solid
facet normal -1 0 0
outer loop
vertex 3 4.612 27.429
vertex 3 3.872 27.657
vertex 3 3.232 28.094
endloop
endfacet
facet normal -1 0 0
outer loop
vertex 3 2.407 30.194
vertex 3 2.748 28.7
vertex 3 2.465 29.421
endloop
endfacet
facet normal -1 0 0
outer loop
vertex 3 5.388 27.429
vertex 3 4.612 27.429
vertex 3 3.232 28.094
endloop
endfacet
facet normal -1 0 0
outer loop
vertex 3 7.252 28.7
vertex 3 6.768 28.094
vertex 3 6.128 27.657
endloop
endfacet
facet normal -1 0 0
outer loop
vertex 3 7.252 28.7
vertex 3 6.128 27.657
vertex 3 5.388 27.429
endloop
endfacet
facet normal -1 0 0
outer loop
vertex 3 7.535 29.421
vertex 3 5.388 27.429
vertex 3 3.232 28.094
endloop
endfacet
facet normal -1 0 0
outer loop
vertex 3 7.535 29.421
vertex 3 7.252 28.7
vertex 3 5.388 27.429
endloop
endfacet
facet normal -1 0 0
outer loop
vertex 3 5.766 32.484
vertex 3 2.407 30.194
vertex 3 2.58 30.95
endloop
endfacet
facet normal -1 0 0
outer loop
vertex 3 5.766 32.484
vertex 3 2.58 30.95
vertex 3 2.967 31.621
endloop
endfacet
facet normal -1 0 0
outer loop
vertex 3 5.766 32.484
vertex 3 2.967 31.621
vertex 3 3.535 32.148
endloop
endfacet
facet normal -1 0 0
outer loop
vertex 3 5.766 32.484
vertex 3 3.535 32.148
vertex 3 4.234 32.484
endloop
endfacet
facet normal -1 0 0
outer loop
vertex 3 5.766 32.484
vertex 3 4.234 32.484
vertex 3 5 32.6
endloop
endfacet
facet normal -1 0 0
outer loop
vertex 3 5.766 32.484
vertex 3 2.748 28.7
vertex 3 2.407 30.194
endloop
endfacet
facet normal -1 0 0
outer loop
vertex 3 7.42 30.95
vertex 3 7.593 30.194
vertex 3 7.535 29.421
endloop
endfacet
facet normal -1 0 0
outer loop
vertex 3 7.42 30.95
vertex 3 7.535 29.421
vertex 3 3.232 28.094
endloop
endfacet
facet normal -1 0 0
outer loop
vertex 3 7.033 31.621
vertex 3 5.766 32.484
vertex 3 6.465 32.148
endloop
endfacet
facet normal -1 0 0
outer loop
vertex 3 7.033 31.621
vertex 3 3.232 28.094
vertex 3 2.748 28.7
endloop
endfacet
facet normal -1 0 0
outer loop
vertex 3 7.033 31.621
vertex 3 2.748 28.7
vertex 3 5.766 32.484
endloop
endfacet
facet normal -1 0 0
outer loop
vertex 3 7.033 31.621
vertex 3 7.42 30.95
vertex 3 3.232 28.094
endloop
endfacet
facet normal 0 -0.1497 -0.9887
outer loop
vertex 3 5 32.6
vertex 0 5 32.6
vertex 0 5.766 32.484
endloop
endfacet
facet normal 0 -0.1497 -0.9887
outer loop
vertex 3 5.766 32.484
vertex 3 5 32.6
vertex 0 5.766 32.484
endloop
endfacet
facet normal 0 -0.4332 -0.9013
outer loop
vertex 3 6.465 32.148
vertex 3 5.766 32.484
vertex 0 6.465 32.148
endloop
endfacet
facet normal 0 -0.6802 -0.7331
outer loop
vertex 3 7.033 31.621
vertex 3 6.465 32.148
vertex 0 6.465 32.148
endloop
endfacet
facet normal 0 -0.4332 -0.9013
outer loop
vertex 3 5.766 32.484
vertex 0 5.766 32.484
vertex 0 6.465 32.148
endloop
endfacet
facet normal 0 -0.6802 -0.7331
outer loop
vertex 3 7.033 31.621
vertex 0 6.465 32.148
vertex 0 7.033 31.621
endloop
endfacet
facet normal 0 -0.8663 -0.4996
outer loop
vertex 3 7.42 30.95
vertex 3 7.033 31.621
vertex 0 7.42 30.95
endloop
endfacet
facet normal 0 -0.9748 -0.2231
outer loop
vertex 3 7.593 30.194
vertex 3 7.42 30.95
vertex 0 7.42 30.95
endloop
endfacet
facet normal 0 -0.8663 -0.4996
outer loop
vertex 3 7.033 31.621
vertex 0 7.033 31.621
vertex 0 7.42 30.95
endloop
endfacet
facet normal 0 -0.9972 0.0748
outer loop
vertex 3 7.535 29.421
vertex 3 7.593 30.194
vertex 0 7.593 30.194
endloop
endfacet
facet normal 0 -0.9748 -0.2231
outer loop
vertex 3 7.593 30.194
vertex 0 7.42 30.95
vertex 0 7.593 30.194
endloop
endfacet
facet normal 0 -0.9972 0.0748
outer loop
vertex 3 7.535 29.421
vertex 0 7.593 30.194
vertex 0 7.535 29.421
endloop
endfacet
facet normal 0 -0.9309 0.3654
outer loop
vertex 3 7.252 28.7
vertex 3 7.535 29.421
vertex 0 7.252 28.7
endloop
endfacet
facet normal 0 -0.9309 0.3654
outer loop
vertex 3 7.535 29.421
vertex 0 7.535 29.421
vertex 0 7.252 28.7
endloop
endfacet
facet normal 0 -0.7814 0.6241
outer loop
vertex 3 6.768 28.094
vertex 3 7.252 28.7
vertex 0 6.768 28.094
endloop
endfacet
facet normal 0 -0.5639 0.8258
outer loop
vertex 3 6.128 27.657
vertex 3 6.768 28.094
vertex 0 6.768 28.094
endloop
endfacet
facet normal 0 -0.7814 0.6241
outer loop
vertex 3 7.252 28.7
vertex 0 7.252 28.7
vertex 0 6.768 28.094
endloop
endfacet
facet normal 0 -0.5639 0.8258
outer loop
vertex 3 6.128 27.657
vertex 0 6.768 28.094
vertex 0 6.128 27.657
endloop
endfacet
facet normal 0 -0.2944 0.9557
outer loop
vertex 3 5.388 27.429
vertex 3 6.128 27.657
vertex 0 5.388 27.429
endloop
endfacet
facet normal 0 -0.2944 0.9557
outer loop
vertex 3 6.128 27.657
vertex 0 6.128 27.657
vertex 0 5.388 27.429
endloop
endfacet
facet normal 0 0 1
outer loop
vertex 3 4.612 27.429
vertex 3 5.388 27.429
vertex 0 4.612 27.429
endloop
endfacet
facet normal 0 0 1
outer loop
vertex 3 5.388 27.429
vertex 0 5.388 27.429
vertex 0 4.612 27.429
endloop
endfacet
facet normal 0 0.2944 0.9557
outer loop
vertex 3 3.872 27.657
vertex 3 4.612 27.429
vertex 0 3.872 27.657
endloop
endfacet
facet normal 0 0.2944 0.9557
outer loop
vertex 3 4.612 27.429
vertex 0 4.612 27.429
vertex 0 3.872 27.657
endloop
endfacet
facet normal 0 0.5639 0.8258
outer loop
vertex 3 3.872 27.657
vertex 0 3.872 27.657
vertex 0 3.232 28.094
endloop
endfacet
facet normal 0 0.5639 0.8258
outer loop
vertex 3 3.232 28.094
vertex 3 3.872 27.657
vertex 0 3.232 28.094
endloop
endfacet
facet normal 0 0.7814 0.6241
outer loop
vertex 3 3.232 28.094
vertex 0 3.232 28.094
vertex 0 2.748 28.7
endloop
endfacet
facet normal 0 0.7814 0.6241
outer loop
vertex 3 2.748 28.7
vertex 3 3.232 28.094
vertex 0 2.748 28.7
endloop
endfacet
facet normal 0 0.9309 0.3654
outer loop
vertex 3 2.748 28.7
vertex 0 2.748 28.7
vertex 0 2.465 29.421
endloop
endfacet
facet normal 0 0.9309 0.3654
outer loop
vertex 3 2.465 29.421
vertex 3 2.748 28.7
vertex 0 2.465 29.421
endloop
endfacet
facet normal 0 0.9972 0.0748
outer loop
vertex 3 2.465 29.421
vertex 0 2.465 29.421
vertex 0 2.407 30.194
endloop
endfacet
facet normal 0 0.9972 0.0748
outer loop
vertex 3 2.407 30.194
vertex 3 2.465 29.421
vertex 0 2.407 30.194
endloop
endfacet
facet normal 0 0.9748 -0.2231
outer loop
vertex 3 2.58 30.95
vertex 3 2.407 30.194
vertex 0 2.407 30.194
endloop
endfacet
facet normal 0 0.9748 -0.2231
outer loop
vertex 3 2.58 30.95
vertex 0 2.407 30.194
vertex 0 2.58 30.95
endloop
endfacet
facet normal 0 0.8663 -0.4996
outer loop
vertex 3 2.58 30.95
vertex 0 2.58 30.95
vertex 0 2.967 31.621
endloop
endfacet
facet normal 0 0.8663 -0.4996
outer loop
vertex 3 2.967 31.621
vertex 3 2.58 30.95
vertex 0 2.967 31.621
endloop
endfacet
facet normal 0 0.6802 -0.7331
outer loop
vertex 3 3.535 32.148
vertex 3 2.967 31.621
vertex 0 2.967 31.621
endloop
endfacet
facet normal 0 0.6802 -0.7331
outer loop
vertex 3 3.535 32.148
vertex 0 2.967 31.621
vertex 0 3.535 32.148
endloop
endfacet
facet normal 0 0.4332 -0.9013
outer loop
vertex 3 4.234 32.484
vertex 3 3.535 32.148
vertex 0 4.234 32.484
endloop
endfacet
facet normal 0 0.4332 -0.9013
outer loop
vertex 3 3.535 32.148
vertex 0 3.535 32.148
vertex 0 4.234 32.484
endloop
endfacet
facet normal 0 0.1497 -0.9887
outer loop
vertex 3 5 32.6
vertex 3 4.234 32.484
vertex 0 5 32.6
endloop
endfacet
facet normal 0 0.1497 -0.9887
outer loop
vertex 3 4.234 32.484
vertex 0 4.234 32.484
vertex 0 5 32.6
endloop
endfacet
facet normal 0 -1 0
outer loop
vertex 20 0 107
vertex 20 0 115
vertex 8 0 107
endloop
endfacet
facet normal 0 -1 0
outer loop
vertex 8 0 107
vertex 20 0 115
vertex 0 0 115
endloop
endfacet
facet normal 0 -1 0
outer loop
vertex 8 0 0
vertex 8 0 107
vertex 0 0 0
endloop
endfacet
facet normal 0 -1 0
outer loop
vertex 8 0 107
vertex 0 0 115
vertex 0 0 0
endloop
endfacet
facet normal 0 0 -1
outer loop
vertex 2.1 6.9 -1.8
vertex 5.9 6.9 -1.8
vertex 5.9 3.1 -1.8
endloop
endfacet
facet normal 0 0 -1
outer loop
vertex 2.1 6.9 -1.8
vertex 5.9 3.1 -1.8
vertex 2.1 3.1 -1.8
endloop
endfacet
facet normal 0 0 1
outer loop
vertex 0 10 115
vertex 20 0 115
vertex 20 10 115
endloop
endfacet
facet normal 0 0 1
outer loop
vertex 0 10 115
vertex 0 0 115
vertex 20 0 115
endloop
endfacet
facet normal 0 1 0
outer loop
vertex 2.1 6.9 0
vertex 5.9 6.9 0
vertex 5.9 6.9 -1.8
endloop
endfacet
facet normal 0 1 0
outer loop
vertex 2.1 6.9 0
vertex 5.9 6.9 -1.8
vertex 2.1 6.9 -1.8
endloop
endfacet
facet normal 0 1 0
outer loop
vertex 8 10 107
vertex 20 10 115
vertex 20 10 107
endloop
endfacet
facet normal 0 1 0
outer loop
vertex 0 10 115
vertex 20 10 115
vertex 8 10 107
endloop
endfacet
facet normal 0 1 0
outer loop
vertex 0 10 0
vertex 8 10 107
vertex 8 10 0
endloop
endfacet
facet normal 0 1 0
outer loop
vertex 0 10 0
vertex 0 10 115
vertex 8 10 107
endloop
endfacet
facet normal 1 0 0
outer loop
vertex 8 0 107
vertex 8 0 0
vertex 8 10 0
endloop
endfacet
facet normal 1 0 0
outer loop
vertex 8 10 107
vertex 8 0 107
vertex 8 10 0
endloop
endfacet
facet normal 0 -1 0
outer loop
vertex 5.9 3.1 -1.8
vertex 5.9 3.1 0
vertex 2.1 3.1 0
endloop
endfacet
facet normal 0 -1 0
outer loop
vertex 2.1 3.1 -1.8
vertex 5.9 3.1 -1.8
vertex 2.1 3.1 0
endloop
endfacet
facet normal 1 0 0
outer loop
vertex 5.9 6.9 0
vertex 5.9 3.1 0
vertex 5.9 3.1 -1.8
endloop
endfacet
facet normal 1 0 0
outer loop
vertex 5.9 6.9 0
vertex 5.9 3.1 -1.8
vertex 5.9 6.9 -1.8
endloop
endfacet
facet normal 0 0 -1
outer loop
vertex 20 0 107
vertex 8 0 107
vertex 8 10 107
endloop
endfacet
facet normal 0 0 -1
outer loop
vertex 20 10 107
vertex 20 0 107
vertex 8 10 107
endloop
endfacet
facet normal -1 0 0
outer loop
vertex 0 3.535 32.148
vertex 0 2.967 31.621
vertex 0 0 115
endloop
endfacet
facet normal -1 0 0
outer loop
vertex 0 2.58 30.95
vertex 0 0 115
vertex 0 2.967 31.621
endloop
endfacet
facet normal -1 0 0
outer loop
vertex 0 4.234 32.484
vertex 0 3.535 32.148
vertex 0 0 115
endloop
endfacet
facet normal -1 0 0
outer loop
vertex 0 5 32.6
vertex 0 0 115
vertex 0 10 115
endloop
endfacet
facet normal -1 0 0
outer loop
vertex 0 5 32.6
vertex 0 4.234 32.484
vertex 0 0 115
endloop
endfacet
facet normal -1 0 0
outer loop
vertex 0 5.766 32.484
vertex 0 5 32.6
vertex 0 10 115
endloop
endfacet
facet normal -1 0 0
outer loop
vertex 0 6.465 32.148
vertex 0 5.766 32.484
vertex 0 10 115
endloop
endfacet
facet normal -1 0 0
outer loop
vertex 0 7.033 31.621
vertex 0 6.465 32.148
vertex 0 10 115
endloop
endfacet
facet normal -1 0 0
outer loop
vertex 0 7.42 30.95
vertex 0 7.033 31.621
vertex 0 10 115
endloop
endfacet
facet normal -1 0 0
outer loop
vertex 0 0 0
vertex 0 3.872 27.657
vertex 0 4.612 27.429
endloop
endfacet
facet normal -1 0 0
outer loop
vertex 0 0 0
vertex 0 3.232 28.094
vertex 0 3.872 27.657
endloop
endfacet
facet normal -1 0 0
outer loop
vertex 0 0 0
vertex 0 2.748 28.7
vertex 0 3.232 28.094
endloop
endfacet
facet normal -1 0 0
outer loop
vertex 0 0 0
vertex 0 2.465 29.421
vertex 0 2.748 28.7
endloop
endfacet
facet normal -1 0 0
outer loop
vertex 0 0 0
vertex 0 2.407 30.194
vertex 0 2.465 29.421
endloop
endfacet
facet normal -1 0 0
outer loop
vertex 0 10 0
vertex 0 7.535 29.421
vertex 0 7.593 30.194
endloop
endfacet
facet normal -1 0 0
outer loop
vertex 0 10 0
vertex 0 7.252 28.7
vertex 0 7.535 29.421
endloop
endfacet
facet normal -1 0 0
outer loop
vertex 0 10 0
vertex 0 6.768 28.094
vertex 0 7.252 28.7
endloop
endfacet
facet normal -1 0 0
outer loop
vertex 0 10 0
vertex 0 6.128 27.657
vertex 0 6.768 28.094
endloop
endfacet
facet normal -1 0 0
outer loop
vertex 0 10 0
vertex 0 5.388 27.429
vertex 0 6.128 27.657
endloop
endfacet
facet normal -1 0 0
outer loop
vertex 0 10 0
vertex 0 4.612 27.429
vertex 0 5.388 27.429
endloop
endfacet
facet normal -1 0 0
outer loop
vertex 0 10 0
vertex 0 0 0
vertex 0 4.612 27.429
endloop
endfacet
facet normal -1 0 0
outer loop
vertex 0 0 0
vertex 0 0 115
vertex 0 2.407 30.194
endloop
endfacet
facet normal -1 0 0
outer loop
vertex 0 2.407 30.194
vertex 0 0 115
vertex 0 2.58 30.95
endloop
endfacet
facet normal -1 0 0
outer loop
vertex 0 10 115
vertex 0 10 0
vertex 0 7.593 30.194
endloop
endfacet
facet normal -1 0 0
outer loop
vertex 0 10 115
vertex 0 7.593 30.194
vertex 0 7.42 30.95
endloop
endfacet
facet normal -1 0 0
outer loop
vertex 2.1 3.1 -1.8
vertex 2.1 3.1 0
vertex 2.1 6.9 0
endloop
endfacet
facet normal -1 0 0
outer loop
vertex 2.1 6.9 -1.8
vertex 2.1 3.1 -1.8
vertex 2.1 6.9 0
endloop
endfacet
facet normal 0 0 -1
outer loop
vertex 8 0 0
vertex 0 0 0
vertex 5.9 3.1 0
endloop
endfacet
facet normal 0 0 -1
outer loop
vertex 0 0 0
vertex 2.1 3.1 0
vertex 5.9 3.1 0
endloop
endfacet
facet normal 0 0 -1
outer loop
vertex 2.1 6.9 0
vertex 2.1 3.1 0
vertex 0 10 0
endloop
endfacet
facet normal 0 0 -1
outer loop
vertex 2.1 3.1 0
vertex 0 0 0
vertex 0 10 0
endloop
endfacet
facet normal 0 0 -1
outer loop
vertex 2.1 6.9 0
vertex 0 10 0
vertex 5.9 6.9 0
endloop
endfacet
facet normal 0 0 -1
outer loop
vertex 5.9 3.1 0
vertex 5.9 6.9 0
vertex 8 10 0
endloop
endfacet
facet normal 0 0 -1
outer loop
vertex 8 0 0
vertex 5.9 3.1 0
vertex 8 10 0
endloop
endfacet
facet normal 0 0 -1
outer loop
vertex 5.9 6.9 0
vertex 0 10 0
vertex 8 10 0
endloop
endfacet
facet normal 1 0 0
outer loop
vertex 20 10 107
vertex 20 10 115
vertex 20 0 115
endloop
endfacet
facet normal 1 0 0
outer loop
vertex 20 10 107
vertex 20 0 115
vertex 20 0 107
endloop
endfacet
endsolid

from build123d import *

# Parameters (mm, degrees)
SKETCH1_W           = 8
SKETCH1_H           = 10
BOSS_EXTRUDE1_DEPTH = 115
SKETCH2_W           = 3.8
SKETCH2_H           = 3.8
BOSS_EXTRUDE2_DEPTH = 1.8
SKETCH4_W           = 8
SKETCH4_H           = 10
BOSS_EXTRUDE4_DEPTH = 12
SKETCH5_R           = 2.6
CUT_EXTRUDE1_DEPTH  = 3


with BuildPart() as part:
    # Sketch1 → Boss-Extrude1 (new body)
    with BuildSketch(Plane.XY):
        with Locations((4, 5)):
            Rectangle(SKETCH1_W, SKETCH1_H)
    extrude(amount=BOSS_EXTRUDE1_DEPTH)

    # Sketch2 → Boss-Extrude2 (add)
    with BuildSketch(Plane(origin=(0, 0, 0), x_dir=(-1, 0, 0), z_dir=(0, 0, -1))):
        with Locations((-4, 5)):
            Rectangle(SKETCH2_W, SKETCH2_H)
    extrude(amount=BOSS_EXTRUDE2_DEPTH)

    # Sketch4 → Boss-Extrude4 (add)
    with BuildSketch(Plane(origin=(8, 0, 0), x_dir=(0, 0, -1), z_dir=(1, 0, 0))):
        with Locations((-111, 5)):
            Rectangle(SKETCH4_W, SKETCH4_H)
    extrude(amount=BOSS_EXTRUDE4_DEPTH)

    # Sketch5 → Cut-Extrude1 (cut)
    with BuildSketch(Plane.ZY):
        with Locations((30, 5)):
            Circle(SKETCH5_R)
    extrude(amount=-CUT_EXTRUDE1_DEPTH, mode=Mode.SUBTRACT)


solid = part.part
